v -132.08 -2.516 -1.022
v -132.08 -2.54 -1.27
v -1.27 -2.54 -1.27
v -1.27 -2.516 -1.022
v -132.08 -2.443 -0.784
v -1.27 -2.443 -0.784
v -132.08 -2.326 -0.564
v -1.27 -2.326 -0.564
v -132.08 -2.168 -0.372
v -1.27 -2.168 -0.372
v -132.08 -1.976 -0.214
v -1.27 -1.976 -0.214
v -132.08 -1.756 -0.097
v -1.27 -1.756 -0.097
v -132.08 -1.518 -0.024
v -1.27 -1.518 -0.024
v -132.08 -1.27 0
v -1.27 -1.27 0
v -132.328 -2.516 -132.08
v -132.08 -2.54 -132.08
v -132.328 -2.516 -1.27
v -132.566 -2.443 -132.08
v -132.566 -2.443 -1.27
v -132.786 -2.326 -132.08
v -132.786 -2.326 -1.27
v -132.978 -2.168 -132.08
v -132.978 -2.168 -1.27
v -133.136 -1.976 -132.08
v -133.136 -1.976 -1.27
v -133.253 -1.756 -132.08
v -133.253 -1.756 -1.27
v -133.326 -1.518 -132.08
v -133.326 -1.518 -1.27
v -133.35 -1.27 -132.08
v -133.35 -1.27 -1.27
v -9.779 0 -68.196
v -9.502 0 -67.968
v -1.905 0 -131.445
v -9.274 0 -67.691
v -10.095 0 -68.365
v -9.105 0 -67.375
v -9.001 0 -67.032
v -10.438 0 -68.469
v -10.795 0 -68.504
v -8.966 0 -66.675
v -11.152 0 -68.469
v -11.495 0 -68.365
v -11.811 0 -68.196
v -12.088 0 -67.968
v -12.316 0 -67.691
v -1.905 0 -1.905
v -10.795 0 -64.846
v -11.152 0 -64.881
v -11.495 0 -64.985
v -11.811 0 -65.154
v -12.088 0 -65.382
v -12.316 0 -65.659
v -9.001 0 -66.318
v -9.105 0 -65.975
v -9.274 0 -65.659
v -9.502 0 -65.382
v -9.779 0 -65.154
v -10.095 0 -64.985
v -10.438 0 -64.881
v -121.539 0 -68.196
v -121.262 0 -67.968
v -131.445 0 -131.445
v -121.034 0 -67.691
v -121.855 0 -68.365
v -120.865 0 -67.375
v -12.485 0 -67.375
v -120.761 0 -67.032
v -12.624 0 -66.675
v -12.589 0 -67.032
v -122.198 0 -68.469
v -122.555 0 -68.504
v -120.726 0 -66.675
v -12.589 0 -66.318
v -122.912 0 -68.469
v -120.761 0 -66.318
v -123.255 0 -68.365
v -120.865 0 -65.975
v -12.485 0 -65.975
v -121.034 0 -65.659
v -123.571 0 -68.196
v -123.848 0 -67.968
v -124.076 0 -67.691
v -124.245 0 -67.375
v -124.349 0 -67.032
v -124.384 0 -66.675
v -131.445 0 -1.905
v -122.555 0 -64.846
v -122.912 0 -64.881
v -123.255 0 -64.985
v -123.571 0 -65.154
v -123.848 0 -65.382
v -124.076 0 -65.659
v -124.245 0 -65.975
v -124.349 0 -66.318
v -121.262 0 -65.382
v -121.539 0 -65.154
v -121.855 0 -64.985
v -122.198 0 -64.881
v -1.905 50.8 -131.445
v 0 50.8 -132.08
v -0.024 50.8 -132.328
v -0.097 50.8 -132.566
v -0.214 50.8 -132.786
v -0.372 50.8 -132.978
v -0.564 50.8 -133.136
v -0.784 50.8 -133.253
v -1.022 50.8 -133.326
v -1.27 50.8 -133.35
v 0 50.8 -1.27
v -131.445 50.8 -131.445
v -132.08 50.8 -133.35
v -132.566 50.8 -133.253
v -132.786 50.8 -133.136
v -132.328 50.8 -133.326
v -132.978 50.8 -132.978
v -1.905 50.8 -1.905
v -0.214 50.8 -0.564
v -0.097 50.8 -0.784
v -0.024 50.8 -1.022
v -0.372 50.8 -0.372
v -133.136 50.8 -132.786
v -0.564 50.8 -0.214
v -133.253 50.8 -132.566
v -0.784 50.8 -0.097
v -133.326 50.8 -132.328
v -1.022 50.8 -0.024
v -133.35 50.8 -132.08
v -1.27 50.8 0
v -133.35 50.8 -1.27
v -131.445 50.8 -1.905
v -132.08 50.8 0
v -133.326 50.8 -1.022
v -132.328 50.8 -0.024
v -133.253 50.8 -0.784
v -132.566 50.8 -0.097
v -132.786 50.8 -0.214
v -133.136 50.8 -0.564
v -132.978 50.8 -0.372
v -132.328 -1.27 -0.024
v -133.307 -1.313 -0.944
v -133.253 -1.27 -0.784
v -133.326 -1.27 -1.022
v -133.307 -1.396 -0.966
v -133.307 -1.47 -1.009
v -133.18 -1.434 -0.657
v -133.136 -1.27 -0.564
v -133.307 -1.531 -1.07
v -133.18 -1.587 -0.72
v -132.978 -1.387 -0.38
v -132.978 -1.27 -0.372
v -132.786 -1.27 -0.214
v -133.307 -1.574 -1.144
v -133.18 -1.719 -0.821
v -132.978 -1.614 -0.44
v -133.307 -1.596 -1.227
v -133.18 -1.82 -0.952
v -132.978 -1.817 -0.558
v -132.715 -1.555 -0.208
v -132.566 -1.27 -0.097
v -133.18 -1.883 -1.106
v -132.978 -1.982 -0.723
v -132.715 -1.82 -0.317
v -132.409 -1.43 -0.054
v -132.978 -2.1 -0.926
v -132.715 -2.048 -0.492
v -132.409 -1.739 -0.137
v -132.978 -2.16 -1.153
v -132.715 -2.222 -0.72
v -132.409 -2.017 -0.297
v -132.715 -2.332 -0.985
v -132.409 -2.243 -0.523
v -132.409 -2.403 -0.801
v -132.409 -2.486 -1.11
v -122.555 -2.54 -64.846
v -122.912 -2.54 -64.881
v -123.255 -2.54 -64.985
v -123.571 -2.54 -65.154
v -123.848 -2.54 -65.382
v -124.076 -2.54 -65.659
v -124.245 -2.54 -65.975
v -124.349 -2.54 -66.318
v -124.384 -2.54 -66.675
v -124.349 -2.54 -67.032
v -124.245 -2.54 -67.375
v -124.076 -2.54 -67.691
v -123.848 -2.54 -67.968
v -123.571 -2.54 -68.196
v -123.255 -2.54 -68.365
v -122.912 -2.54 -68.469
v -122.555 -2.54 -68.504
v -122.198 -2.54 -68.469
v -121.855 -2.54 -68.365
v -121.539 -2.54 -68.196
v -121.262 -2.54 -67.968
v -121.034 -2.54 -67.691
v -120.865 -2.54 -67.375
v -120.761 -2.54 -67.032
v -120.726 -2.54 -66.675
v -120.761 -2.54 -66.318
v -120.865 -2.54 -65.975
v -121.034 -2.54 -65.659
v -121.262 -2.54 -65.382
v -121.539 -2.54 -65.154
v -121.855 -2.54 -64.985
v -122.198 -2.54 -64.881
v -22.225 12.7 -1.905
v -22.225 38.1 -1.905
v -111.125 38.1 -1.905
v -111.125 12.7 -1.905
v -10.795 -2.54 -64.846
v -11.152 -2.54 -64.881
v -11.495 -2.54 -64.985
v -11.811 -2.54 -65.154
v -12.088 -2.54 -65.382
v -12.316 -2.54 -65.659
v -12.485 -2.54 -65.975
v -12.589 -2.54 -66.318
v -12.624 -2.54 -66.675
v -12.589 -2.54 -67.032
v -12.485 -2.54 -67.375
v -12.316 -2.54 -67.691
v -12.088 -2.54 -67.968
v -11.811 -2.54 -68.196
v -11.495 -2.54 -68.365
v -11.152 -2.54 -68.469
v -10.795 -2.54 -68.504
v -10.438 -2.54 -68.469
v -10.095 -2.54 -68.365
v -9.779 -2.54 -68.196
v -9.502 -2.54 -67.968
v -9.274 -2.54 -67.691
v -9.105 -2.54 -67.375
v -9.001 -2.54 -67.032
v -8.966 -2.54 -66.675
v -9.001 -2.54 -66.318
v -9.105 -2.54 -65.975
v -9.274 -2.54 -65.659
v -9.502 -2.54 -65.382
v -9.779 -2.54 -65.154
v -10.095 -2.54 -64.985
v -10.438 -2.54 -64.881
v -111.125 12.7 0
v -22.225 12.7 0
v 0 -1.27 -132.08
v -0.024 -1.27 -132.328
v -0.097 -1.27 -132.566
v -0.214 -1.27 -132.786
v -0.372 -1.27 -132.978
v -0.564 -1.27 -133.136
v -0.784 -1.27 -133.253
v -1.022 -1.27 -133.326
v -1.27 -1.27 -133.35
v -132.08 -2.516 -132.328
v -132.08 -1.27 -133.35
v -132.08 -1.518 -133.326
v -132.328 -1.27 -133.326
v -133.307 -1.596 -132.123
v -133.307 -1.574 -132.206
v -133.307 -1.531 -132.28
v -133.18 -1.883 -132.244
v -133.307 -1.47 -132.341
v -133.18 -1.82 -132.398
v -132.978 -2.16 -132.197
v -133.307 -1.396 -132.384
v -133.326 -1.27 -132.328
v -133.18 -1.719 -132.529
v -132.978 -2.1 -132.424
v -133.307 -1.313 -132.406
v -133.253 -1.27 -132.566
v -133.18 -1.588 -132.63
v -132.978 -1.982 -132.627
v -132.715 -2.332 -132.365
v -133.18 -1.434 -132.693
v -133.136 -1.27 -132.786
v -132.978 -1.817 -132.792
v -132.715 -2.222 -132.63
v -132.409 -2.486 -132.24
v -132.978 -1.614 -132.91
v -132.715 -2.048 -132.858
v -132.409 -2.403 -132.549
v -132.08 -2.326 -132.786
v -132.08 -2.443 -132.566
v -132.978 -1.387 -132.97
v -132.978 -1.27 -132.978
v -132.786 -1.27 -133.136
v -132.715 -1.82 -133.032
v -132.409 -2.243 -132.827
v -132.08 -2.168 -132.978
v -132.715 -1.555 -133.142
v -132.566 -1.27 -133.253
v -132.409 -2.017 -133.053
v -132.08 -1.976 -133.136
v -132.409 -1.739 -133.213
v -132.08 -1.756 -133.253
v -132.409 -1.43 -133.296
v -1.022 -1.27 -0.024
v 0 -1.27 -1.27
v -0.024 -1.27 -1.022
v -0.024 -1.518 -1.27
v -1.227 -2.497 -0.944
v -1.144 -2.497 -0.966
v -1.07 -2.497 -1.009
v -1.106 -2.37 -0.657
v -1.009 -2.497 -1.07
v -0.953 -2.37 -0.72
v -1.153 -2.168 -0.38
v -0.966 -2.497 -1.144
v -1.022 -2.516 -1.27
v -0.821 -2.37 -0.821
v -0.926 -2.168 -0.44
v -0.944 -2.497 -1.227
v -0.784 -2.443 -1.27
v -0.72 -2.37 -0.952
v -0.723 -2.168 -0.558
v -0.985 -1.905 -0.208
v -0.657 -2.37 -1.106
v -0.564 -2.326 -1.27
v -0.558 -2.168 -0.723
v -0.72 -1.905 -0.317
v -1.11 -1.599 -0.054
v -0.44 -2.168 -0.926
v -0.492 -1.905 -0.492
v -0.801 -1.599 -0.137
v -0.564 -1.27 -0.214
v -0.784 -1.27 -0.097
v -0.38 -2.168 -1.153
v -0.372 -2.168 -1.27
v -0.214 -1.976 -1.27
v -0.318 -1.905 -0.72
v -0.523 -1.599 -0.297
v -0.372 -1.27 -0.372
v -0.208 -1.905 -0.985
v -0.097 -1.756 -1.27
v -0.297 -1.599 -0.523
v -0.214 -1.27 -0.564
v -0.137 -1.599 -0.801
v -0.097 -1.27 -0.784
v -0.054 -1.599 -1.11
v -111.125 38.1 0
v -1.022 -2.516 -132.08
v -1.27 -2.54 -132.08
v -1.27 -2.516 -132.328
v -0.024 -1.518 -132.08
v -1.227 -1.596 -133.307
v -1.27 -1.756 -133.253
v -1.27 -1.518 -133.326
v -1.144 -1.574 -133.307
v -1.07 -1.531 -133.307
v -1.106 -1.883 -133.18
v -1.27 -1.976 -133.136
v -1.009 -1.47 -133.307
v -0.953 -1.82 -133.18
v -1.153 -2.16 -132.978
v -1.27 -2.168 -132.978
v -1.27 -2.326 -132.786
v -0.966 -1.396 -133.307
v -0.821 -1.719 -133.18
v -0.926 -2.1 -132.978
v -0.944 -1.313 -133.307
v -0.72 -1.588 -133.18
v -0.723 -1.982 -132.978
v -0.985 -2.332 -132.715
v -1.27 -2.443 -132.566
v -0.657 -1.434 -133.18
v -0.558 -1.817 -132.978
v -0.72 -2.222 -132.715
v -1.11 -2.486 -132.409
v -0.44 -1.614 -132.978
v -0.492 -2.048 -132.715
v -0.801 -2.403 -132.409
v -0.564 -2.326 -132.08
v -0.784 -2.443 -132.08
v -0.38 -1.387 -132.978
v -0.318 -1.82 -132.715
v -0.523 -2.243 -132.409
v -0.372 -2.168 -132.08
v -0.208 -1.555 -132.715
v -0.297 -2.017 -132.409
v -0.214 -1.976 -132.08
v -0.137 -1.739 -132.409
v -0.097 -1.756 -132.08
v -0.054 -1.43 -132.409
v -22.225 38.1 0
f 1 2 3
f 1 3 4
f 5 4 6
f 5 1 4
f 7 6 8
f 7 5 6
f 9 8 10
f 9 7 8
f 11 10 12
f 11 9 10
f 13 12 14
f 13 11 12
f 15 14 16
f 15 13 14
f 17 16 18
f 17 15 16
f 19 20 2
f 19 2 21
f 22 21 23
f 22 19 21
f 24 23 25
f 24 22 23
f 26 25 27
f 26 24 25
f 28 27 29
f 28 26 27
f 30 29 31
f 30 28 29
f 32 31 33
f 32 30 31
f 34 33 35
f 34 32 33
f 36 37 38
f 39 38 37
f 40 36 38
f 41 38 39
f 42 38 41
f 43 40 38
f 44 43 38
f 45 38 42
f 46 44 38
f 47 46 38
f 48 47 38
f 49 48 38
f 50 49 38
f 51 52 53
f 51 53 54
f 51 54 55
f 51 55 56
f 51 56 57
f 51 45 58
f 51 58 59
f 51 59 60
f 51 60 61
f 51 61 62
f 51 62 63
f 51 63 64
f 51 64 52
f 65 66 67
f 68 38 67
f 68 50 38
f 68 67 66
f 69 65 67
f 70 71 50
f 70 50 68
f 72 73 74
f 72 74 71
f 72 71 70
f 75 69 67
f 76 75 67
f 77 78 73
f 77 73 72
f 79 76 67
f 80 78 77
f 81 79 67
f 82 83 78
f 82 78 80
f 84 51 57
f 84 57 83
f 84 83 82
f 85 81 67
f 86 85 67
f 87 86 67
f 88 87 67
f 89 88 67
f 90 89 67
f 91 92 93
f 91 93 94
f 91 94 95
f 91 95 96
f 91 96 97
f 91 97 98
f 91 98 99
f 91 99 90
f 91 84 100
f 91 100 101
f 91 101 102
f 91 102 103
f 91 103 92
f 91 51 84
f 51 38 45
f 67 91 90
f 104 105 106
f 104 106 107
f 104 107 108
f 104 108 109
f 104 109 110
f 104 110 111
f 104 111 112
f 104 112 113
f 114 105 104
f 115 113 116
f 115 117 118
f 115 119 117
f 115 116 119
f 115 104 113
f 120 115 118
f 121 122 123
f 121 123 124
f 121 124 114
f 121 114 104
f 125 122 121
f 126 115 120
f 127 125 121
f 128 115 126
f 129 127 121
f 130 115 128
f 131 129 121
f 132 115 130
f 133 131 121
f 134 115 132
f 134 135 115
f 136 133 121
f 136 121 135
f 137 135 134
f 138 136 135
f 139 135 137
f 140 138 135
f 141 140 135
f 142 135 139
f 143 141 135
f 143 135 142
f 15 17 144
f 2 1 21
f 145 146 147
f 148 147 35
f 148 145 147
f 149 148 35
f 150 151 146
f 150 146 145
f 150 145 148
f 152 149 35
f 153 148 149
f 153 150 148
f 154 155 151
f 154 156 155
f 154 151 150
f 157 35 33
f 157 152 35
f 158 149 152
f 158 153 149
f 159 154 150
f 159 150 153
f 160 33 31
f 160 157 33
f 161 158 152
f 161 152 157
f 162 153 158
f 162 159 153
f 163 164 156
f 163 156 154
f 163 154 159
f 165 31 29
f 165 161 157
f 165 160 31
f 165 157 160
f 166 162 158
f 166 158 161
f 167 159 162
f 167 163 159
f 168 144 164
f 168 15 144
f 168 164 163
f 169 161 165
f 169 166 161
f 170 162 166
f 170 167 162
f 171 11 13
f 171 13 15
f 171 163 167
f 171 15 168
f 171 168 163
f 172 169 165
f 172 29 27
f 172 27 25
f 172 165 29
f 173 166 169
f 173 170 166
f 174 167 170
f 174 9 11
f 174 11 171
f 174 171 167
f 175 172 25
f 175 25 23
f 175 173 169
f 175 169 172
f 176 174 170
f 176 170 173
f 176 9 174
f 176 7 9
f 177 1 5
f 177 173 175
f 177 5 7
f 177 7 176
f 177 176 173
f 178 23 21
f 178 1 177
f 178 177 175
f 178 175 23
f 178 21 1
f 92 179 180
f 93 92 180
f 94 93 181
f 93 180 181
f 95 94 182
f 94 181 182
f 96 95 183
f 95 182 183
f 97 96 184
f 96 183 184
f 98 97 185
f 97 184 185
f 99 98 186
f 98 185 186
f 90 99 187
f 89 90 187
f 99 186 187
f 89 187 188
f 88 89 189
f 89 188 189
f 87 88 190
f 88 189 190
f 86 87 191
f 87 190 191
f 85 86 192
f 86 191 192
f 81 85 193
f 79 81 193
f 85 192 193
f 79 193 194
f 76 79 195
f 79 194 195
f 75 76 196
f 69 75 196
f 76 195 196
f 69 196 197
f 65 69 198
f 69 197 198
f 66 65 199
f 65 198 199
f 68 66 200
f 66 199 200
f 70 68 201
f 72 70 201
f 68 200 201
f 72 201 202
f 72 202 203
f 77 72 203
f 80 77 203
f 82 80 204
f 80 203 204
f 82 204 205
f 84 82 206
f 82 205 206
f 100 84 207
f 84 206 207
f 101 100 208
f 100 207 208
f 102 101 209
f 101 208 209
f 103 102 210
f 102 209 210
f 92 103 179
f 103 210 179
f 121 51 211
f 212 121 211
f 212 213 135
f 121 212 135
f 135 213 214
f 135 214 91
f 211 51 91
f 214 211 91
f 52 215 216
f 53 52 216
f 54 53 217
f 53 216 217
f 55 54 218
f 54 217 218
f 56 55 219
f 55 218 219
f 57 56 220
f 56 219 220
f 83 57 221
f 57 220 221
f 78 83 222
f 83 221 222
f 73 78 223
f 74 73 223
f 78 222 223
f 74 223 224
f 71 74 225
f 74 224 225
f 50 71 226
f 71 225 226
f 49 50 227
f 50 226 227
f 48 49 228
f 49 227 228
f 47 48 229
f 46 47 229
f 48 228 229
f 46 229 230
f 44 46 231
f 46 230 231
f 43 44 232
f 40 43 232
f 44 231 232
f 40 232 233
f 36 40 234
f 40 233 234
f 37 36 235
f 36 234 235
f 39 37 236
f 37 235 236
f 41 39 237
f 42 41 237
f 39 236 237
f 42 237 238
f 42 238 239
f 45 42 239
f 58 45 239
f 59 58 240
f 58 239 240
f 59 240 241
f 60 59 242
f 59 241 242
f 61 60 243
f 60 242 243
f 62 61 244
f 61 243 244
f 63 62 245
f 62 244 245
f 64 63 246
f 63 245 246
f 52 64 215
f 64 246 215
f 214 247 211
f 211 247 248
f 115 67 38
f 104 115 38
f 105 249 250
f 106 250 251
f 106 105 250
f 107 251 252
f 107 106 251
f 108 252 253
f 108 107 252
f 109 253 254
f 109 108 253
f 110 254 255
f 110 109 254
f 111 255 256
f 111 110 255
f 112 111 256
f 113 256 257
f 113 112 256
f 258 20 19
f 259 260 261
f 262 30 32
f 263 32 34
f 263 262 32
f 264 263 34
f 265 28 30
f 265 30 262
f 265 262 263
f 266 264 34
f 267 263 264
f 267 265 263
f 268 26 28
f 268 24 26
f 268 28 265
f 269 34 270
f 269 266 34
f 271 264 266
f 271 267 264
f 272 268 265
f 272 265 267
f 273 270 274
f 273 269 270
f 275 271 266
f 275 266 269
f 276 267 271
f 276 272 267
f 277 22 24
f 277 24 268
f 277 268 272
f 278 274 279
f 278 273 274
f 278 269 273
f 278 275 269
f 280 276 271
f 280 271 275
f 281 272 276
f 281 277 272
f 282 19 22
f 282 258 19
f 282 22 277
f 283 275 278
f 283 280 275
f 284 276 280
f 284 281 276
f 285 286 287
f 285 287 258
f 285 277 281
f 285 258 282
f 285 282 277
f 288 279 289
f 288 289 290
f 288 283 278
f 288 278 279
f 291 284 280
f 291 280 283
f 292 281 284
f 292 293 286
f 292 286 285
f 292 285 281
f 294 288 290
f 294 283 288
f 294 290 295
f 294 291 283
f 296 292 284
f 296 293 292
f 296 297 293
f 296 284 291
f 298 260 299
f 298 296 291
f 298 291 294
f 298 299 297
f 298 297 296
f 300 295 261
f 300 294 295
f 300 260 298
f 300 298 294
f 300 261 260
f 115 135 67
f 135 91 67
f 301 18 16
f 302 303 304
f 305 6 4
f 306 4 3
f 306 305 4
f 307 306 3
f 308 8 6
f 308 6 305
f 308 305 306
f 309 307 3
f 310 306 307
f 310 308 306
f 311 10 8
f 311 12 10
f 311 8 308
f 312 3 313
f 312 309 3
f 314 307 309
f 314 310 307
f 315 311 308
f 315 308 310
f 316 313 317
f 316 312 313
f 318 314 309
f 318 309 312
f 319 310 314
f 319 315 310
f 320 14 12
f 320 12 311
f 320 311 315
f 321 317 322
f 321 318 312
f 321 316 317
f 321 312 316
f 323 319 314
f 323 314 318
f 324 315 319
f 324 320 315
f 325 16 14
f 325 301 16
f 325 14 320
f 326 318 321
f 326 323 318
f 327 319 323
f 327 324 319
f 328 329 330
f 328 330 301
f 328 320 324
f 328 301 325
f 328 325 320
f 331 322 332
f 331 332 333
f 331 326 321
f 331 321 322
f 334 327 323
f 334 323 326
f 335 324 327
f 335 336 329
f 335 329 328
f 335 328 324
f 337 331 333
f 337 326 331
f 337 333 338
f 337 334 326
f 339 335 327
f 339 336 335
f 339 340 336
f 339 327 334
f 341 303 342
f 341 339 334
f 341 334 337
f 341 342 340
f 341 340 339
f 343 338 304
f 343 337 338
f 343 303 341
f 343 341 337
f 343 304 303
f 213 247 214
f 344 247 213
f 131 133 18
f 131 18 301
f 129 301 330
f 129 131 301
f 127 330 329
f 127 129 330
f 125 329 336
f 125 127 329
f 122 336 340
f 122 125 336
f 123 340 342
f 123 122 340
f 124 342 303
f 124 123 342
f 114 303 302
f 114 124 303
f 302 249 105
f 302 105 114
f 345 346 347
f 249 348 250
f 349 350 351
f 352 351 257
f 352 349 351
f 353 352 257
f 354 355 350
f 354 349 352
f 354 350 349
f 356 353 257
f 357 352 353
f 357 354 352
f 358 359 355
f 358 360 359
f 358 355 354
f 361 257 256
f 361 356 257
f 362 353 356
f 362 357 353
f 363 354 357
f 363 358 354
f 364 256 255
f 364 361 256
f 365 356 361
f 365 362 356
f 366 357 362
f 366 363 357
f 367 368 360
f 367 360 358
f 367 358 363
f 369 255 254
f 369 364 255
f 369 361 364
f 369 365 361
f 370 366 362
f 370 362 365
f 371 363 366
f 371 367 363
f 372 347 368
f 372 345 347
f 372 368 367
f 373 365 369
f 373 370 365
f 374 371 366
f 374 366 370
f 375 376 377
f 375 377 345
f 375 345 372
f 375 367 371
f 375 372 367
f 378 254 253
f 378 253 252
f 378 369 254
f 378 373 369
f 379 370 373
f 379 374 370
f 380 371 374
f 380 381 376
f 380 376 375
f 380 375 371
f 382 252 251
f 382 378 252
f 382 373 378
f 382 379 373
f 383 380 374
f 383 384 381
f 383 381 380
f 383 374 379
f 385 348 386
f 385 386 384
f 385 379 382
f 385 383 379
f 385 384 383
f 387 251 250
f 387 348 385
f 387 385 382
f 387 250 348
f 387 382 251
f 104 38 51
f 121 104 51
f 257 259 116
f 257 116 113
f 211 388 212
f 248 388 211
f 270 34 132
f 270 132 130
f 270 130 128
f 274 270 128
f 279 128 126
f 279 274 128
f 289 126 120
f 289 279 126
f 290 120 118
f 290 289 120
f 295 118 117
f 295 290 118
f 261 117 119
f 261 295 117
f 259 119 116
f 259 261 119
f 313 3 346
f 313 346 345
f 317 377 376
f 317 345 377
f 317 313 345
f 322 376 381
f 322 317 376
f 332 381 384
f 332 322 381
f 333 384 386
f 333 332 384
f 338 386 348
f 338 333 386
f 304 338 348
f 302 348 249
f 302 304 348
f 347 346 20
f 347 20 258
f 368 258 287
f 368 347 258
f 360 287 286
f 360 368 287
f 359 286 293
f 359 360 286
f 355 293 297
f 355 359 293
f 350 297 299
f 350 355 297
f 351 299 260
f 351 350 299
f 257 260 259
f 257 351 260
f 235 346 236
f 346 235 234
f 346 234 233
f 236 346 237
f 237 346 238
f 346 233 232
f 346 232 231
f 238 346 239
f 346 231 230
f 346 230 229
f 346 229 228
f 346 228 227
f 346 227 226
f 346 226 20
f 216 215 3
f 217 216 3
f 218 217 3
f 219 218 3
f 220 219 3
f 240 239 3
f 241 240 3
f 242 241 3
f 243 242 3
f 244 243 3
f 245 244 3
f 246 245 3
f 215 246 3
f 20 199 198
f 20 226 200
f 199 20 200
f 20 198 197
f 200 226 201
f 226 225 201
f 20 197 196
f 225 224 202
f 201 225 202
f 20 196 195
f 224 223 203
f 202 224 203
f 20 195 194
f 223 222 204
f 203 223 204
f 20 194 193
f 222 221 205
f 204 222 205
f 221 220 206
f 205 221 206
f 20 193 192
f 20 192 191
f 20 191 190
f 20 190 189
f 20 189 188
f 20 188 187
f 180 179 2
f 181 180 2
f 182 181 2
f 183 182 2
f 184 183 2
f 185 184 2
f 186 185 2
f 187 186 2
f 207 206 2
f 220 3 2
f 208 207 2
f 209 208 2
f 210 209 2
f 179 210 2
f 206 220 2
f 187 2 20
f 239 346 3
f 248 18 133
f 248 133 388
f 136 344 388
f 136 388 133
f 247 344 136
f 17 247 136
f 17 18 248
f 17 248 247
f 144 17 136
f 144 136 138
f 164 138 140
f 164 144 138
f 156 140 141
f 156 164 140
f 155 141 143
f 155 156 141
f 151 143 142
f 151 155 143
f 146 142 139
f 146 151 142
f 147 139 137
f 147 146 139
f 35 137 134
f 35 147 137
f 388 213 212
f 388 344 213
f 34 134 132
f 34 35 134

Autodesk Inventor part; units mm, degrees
ref_plane "YZ Plane" through (0, 0, 0) normal (1, 0, 0) x (0, 1, 0)
ref_plane "XZ Plane" through (0, 0, 0) normal (0, 1, 0) x (-1, 0, 0)
ref_plane "XY Plane" through (0, 0, 0) normal (0, 0, 1) x (1, 0, 0)
sketch "Sketch1" plane through (0, 0, 0) normal (0, 1, 0) x (-1, 0, 0)
  line L0 (0, 0) -> (133.35, 0)
  line L1 (133.35, 0) -> (133.35, -133.35)
  line L2 (133.35, -133.35) -> (0, -133.35)
  line L3 (0, -133.35) -> (0, 0)
  line L4 (131.445, -131.445) -> (1.905, -131.445)
  line L5 (1.905, -131.445) -> (1.905, -1.905)
  line L6 (1.905, -1.905) -> (131.445, -1.905)
  line L7 (131.445, -1.905) -> (131.445, -131.445)
  line L8 (131.445, -131.445) -> (1.905, -1.905) construction
  line L9 (1.905, -131.445) -> (131.445, -1.905) construction
  point P0 (66.675, -66.675)
  dimension "d0" = 133.35
  dimension "d1" = 133.35
  dimension "d2" = 129.54
  dimension "d3" = 129.54
extrude "Extrusion1" add sketch "Sketch1" along normal blind 50.8
extrude "Extrusion2" add sketch "Sketch1" against normal blind 2.54 contours L0 L1 L2 L3 | L4 L5 L6 L7
fillet "Fillet1" radius 1.27 8 edges at (0, 24.13, 0) (0, -2.54, -66.675) (-66.675, -2.54, 0) (0, 24.13, -133.35) (-66.675, -2.54, -133.35) (-133.35, 24.13, -133.35) (-133.35, -2.54, -66.675) (-133.35, 24.13, 0)
sketch "Sketch2" plane through (0, 0, 0) normal (0, 1, 0) x (1, 0, 0)
  line L0 (-131.445, 1.905) -> (-131.445, 131.445) projected
  line L1 (-1.905, 1.905) -> (-131.445, 1.905) projected
  line L2 (-1.905, 131.445) -> (-1.905, 1.905) projected
  line L3 (-131.445, 131.445) -> (-1.905, 131.445) projected
  line L4 (-66.675, 66.675) -> (-10.795, 66.675)
  line L5 (-66.675, 66.675) -> (-10.795, 66.675) construction
  line L6 (-10.795, 66.675) -> (-122.555, 66.675)
  point P0 (0, 0)
  dimension "d9" = 55.88
  dimension "d10" = 0
  dimension "d11" = 111.76
hole "Hole1" at (-10.795, 0, -66.675) at (-122.555, 0, -66.675) direction (0, -1, 0) diameter 3.6576 end through all
sketch "Sketch3" plane through (-132.08, -1.27, 0) normal (0, 0, 1) x (1, 0, 0)
  line L0 (130.175, 1.27) -> (0.635, 1.27) projected
  line L1 (65.405, 1.27) -> (65.405, 13.97)
  line L2 (65.405, 13.97) -> (109.855, 13.97)
  line L3 (109.855, 13.97) -> (20.955, 13.97)
  line L4 (20.955, 13.97) -> (20.955, 39.37)
  line L5 (20.955, 39.37) -> (109.855, 39.37)
  line L6 (109.855, 39.37) -> (109.855, 13.97)
  point P0 (132.08, 1.27)
  dimension "d19" = 12.7
  dimension "d20" = 44.45
  dimension "d21" = 88.9
  dimension "d22" = 25.4
extrude "Extrusion3" cut sketch "Sketch3" against normal blind 2.54
properties part number "TC720 box"
